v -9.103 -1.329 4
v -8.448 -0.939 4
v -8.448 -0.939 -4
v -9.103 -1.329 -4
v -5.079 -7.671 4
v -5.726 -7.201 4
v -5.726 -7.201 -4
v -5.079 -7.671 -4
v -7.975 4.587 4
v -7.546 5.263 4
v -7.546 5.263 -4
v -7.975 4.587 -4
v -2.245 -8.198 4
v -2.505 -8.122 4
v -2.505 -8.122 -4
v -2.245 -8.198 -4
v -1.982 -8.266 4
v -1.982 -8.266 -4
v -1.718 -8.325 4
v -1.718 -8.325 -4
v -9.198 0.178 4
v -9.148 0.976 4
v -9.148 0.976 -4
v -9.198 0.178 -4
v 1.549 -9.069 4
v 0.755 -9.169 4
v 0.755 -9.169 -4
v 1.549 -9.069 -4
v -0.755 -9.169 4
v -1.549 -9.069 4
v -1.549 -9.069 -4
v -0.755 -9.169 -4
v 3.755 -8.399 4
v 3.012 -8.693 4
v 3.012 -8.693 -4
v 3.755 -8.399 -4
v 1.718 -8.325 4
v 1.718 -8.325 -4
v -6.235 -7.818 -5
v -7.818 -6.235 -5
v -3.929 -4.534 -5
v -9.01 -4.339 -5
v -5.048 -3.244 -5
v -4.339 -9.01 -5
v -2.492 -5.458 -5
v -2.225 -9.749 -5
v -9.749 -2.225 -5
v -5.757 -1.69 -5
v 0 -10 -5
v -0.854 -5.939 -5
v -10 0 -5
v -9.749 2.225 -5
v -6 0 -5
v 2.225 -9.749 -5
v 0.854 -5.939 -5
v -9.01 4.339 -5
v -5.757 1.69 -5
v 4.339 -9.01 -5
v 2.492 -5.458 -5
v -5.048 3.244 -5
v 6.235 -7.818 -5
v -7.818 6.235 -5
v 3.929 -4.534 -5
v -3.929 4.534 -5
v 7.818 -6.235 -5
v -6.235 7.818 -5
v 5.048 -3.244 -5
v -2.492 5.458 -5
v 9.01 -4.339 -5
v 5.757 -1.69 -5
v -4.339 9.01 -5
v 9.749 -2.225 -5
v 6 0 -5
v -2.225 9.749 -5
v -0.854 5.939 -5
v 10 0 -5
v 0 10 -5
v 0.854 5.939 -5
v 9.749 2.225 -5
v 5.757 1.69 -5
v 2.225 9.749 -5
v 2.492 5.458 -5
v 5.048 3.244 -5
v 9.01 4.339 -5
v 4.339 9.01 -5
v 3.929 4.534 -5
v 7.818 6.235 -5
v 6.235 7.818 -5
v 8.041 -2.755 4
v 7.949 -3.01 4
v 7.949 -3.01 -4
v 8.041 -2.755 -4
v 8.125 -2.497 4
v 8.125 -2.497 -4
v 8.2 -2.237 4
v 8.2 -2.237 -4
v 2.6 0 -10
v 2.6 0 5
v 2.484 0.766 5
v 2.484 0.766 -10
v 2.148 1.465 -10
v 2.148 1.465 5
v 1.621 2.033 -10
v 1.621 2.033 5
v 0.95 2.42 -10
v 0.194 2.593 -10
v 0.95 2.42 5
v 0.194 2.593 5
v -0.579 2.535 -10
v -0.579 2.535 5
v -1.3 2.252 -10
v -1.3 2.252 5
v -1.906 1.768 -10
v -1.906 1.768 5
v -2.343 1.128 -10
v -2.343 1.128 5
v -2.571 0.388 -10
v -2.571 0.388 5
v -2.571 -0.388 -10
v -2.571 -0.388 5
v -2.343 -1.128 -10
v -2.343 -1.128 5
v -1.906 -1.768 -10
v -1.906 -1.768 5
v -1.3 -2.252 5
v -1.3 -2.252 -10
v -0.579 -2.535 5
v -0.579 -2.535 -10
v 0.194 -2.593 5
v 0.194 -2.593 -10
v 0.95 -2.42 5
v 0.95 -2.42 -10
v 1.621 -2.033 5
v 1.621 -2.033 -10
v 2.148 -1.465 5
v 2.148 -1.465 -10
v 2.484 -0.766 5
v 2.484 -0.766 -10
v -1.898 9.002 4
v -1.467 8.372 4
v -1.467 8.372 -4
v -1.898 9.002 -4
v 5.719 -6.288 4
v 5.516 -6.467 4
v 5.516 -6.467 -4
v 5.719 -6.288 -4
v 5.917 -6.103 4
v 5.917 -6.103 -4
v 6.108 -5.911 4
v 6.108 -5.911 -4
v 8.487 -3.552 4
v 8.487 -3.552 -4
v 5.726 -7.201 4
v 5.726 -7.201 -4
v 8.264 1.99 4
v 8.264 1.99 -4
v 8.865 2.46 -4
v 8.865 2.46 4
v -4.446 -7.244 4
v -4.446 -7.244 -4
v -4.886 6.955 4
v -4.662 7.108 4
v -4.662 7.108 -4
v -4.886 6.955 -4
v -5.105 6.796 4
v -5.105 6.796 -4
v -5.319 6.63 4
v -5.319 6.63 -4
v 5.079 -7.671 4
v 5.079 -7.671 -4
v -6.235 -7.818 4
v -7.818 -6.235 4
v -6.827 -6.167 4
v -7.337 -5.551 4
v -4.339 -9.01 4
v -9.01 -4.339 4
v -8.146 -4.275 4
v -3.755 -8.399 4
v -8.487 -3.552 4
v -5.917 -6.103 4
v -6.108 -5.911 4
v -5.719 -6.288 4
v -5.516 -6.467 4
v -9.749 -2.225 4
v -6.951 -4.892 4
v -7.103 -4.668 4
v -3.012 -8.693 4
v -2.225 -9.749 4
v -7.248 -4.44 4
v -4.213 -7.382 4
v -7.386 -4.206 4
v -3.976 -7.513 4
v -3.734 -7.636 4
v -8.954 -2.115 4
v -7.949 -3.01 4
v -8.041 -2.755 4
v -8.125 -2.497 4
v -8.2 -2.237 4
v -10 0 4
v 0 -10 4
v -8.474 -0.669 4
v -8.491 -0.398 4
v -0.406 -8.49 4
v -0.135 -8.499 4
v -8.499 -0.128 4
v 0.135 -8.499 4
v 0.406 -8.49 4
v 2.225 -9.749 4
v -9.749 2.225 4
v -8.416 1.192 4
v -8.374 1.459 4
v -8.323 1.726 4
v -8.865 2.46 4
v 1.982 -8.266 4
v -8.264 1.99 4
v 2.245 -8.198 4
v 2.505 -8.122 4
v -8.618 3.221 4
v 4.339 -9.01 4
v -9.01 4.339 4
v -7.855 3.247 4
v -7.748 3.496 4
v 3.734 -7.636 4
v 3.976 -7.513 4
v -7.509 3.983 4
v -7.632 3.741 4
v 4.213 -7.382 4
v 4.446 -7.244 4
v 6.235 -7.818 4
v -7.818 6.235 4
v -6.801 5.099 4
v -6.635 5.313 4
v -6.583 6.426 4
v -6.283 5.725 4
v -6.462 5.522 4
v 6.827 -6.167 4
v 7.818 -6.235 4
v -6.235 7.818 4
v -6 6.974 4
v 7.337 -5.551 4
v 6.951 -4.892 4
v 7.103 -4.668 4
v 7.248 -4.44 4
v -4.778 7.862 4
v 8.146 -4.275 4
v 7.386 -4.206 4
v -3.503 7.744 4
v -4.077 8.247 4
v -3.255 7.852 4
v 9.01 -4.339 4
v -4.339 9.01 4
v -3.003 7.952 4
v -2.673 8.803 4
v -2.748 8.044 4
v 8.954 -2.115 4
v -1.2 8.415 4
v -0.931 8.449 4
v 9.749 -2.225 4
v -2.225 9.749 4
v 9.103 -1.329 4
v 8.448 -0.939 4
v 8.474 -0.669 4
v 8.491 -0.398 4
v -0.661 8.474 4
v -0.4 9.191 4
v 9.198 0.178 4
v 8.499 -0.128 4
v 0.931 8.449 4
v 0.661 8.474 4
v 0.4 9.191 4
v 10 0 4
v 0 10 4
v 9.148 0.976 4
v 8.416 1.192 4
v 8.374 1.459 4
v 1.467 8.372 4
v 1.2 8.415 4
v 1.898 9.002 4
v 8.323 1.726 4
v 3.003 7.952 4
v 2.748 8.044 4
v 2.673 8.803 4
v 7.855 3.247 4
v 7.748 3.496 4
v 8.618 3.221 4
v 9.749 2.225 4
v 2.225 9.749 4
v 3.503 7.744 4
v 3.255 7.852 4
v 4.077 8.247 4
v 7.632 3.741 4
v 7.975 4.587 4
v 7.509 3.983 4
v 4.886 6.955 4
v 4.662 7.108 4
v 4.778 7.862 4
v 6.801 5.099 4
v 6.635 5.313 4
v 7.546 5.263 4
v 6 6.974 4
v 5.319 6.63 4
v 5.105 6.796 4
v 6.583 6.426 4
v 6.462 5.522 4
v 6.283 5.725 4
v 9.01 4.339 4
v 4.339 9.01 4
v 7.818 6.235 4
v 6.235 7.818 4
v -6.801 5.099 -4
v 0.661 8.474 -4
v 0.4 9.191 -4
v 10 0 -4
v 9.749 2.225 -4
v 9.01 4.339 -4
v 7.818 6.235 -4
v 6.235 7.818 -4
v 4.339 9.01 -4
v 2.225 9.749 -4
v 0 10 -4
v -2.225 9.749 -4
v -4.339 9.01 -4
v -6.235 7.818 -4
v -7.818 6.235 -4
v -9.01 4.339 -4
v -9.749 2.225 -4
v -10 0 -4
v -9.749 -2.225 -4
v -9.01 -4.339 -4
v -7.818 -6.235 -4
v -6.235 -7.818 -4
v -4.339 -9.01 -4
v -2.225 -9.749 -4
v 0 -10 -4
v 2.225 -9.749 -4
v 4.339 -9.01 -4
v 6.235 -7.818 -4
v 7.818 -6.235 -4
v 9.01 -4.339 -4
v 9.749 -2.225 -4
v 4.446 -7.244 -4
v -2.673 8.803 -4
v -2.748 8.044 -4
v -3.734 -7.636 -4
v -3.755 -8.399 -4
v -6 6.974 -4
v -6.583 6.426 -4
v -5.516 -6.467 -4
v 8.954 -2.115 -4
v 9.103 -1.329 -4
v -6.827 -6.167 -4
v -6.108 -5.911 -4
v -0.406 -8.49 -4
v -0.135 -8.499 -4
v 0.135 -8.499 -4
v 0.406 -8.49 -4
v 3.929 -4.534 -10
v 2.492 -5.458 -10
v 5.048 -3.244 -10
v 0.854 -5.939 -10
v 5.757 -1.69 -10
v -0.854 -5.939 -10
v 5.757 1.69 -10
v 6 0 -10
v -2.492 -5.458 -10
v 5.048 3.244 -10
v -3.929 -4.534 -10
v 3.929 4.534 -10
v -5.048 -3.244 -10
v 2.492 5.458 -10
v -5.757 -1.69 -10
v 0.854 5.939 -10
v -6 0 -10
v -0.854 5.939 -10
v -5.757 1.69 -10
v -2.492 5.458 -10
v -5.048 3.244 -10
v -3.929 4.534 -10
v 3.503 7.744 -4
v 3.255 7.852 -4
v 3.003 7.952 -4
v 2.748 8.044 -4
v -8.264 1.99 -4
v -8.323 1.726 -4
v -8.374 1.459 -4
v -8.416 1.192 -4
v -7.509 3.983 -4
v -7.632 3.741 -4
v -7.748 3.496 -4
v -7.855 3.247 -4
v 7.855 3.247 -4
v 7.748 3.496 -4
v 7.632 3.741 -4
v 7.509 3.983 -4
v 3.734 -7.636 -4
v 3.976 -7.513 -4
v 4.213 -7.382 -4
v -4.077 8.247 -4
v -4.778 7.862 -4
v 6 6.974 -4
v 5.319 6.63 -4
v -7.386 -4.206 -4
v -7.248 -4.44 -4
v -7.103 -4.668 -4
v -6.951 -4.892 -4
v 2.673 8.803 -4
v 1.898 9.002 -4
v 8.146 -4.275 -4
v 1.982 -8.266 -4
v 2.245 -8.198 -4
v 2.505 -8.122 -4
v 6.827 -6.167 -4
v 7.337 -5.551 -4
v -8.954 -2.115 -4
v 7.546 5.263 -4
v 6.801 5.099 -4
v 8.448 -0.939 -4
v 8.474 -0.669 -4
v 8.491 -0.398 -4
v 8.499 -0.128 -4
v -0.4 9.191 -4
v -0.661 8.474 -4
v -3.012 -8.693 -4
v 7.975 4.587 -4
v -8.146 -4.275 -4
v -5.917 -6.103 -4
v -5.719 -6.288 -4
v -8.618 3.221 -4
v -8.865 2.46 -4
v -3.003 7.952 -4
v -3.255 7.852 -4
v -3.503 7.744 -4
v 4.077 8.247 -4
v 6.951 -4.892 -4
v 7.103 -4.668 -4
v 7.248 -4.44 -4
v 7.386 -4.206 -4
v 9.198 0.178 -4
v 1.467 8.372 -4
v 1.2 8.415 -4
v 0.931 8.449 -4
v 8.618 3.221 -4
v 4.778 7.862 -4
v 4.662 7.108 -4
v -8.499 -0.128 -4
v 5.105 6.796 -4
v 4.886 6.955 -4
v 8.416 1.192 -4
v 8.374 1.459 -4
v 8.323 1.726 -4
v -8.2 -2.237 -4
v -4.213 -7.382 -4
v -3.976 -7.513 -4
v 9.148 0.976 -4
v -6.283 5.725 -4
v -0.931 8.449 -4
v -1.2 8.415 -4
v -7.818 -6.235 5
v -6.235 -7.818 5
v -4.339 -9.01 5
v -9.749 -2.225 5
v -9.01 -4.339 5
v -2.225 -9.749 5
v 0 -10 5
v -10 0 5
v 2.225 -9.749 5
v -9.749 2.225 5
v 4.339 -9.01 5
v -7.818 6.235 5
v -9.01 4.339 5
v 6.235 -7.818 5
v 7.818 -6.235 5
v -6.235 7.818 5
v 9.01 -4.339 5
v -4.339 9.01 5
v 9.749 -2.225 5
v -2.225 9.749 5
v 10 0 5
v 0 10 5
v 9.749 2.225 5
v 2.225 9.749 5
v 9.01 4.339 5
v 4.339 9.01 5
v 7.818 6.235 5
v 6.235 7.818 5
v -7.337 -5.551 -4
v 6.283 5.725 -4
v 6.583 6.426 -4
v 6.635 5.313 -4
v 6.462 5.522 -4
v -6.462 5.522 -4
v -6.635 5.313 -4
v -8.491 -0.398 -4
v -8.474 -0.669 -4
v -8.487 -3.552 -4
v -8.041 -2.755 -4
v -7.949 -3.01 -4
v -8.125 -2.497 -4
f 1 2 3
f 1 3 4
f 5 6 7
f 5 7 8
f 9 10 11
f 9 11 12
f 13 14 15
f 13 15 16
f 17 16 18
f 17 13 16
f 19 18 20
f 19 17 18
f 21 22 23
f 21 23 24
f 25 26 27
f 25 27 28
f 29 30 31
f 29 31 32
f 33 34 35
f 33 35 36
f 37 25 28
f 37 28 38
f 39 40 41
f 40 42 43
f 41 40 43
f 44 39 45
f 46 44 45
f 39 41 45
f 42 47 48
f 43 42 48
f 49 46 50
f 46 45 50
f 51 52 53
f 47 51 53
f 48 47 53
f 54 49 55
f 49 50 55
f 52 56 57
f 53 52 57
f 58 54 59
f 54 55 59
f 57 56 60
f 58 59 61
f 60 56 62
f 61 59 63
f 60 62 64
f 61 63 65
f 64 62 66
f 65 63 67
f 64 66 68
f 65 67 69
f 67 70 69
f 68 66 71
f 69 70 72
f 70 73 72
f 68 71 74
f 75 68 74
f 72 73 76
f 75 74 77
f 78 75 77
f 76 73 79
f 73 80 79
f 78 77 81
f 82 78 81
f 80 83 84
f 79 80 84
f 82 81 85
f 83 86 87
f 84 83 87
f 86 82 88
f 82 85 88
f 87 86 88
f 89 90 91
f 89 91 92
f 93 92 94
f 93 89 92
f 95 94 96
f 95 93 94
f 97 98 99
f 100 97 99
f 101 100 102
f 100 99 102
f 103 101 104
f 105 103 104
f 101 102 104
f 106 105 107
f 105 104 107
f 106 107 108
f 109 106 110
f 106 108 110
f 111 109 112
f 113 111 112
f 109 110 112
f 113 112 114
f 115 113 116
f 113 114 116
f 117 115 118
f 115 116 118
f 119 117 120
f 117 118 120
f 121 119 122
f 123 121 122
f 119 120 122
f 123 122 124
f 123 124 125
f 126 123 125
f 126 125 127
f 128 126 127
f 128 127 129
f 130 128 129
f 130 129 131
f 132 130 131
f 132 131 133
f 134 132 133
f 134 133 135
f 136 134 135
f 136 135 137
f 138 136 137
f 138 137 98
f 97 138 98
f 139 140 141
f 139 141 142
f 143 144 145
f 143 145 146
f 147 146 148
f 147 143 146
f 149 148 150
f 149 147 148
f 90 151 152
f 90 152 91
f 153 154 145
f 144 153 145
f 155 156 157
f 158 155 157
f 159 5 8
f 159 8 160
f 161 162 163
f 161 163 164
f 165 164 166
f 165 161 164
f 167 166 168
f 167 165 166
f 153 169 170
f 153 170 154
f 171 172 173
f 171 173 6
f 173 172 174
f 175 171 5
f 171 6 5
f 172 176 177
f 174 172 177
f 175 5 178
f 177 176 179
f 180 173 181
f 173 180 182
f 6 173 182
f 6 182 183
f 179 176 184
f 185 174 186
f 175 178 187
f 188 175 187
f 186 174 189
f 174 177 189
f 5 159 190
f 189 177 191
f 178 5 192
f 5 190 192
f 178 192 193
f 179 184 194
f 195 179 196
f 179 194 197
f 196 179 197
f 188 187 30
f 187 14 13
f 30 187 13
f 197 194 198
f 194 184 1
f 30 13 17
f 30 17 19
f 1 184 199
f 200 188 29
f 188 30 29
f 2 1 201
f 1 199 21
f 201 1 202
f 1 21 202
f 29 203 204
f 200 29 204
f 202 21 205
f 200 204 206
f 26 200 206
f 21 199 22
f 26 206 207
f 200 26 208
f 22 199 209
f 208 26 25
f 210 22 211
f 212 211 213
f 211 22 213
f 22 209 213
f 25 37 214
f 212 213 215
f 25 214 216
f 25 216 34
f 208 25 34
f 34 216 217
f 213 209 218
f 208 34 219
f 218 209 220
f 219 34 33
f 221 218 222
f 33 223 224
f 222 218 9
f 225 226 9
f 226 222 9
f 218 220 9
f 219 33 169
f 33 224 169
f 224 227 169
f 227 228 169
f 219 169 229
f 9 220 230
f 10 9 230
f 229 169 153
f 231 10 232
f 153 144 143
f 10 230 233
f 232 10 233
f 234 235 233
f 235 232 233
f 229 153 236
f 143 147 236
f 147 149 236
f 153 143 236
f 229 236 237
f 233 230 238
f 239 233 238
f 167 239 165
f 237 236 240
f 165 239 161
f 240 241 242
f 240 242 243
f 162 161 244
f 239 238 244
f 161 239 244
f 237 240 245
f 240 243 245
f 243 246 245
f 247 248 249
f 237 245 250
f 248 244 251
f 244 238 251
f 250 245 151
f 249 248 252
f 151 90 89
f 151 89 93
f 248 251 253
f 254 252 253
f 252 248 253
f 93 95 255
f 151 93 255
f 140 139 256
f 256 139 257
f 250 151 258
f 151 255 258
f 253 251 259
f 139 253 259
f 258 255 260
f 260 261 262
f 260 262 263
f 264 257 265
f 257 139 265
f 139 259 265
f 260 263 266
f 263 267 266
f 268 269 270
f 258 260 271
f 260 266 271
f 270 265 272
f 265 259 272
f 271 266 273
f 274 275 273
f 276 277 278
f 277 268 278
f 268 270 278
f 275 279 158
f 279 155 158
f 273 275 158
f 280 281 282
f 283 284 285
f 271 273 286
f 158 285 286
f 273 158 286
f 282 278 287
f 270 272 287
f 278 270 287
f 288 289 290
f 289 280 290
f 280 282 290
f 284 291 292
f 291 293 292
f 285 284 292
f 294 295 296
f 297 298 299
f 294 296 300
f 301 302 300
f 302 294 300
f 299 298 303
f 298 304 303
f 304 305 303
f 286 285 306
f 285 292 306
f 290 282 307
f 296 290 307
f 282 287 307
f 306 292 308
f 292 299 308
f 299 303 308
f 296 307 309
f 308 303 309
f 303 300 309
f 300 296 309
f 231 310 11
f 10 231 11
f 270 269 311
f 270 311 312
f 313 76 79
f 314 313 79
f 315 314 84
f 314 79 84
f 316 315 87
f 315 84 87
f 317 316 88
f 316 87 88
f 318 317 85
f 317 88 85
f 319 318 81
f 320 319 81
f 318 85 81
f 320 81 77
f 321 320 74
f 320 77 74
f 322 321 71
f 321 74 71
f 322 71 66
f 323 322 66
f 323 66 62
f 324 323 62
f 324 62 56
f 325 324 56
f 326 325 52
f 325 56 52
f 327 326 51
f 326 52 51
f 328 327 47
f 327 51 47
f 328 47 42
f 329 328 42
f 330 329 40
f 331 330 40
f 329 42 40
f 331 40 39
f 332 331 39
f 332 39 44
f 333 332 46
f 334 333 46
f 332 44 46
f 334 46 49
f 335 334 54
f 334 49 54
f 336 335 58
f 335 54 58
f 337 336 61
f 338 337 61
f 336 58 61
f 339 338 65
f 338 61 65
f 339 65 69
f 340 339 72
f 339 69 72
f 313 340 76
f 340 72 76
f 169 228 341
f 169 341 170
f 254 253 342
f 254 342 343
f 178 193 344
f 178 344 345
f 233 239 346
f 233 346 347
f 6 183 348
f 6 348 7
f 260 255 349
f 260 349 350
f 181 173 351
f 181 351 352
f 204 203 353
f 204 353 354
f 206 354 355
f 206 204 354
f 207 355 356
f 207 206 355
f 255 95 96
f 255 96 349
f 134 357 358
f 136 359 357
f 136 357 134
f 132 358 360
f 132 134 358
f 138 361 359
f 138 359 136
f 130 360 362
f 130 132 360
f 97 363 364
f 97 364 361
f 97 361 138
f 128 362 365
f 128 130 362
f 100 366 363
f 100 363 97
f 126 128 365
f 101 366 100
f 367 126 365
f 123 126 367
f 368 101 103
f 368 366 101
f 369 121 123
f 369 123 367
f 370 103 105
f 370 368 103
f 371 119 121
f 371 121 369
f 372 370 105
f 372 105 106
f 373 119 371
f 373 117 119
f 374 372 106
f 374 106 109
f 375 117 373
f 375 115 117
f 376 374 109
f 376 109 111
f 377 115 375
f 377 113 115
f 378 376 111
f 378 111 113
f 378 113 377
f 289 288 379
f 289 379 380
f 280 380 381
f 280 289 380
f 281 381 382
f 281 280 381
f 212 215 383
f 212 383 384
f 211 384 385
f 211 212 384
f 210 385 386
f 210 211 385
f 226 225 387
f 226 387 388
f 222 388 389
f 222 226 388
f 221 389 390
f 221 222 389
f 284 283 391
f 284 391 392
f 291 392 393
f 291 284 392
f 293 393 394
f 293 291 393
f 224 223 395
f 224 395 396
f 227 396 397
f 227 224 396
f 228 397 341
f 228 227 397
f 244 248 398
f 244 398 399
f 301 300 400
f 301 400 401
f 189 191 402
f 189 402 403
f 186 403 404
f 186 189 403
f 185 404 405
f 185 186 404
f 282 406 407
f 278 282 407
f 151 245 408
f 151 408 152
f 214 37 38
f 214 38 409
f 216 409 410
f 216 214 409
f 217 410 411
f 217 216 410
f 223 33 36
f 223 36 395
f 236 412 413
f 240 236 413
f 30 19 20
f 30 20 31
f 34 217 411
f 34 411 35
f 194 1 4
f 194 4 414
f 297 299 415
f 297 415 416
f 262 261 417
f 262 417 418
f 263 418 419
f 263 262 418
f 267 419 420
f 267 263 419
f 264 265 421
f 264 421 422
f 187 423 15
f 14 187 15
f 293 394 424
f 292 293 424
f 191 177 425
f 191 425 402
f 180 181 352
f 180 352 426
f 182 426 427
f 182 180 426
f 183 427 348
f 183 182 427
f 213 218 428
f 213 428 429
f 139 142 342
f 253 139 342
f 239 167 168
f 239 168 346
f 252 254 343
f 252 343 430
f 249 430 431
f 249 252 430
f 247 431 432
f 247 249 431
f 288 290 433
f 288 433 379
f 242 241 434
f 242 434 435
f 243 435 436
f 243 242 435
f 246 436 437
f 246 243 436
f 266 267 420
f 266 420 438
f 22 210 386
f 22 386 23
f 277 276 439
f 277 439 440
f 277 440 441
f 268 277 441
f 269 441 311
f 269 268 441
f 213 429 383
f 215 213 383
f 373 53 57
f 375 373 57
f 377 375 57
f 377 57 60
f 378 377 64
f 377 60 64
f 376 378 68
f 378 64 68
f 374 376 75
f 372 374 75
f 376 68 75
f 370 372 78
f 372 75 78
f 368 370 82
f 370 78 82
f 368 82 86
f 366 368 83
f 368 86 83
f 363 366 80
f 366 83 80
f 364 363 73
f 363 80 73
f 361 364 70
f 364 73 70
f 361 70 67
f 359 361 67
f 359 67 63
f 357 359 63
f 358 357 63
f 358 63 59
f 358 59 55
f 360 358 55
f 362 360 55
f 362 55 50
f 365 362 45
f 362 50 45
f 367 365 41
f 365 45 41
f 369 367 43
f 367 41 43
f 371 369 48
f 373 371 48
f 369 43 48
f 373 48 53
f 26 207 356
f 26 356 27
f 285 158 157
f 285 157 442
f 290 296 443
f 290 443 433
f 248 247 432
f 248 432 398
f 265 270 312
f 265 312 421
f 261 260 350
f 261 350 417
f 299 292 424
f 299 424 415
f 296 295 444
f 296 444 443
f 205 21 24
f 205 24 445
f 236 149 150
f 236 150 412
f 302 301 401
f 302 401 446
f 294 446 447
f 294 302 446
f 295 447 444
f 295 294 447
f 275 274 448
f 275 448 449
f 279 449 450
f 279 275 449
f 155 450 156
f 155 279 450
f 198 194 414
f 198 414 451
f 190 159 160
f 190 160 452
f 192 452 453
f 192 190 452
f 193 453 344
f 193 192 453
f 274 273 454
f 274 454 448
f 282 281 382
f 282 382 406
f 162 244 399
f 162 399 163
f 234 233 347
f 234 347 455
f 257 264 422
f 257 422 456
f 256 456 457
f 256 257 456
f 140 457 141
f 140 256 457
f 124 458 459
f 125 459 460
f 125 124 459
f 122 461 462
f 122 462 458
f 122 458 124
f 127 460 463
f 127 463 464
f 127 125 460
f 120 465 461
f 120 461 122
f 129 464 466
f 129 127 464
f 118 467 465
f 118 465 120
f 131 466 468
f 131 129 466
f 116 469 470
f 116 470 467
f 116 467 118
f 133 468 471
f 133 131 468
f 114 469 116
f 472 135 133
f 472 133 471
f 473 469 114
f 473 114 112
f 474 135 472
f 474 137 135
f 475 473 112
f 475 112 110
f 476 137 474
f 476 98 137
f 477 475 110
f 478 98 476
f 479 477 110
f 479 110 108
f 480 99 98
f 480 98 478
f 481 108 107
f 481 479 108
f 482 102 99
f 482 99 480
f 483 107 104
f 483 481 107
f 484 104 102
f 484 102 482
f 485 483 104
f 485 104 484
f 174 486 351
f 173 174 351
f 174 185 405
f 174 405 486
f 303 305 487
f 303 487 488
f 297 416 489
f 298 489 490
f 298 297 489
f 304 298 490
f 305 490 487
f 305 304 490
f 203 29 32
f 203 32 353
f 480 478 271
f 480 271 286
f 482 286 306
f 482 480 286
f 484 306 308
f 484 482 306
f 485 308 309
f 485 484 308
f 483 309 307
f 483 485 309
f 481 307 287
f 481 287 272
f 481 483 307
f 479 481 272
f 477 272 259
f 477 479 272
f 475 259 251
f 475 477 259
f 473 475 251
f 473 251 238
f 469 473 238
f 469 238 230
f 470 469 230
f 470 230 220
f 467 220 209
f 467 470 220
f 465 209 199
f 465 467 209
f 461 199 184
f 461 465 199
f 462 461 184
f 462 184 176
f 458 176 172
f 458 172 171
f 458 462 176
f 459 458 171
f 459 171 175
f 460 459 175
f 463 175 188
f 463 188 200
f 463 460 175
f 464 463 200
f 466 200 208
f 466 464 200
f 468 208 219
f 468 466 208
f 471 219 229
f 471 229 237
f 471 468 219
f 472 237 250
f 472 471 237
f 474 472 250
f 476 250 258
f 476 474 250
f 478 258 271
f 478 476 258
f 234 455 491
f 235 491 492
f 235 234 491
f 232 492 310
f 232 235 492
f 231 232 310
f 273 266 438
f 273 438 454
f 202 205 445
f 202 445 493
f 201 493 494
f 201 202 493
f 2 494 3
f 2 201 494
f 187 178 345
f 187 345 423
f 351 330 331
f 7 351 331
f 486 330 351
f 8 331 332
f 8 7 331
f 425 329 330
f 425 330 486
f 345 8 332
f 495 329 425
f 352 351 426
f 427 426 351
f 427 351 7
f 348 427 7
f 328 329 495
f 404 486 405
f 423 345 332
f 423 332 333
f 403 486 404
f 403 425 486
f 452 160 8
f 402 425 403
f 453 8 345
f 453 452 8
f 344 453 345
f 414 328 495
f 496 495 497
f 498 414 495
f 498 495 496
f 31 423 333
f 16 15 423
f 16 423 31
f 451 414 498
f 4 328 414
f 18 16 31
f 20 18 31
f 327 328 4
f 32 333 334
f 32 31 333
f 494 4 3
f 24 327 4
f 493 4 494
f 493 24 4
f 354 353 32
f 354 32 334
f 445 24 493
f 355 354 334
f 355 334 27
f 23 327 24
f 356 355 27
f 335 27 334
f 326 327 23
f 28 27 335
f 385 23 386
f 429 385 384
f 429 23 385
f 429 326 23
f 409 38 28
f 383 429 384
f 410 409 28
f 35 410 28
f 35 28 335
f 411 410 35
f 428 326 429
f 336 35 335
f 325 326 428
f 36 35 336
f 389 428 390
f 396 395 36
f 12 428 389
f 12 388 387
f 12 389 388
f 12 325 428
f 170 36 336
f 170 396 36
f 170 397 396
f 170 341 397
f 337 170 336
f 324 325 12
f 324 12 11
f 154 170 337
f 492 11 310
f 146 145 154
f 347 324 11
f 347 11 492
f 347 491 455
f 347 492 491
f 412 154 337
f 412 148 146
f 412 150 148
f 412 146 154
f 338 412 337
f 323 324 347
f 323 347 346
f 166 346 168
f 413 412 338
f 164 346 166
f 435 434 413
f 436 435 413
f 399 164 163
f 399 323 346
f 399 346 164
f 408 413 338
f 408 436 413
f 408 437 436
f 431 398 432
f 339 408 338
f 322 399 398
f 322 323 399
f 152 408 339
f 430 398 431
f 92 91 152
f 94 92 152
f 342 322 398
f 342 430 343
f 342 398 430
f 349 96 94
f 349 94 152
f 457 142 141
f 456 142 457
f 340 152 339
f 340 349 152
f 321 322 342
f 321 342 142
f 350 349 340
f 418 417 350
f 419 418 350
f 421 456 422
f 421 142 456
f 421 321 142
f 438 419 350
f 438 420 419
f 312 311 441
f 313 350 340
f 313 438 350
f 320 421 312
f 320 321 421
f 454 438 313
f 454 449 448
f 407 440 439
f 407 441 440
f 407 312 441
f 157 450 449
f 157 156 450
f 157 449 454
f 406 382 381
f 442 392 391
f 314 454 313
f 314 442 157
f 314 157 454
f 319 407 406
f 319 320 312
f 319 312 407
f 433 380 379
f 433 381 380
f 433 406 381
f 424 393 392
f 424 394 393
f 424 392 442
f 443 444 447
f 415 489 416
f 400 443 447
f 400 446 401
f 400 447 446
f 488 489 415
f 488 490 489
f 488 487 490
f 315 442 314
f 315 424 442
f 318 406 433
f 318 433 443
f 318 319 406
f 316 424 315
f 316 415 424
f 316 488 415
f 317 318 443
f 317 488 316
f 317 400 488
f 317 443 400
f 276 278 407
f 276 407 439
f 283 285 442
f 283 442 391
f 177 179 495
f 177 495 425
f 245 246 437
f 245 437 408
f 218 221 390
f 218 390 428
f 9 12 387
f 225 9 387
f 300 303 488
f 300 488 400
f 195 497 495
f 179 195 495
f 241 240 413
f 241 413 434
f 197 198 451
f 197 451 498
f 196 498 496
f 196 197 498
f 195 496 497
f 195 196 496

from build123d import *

# Parameters (mm, degrees)
BOSS_EXTRUDE1_DEPTH = 5
SKETCH2_R           = 10
BOSS_EXTRUDE2_DEPTH = 1
SKETCH4_R           = 6
BOSS_EXTRUDE3_DEPTH = 5
CUT_EXTRUDE1_REACH  = 22.616
SKETCH5_R           = 2.6


with BuildPart() as part:
    # Sketch1 → Boss-Extrude1 (new, symmetric)
    with BuildSketch(Plane.XY):
        with BuildLine():
            Line((-0.4, 9.191300234), (-0.660980834, 8.474261286))
            ThreePointArc((-0.660980834, 8.474261286), (-1.065332485, 8.432974961), (-1.467248177, 8.372406033))
            Line((-1.467248177, 8.372406033), (-1.898350154, 9.002014591))
            Line((-1.898350154, 9.002014591), (-2.673216683, 8.803062681))
            Line((-2.673216683, 8.803062681), (-2.747677989, 8.043647535))
            ThreePointArc((-2.747677989, 8.043647535), (-3.129058698, 7.90310013), (-3.503284589, 7.744481718))
            Line((-3.503284589, 7.744481718), (-4.077419986, 8.247099263))
            Line((-4.077419986, 8.247099263), (-4.77846533, 7.861696324))
            Line((-4.77846533, 7.861696324), (-4.66172843, 7.107621828))
            ThreePointArc((-4.66172843, 7.107621828), (-4.996174644, 6.876644452), (-5.319196746, 6.629943135))
            Line((-5.319196746, 6.629943135), (-6.000290524, 6.973988359))
            Line((-6.000290524, 6.973988359), (-6.583465426, 6.426350674))
            Line((-6.583465426, 6.426350674), (-6.282865329, 5.724998101))
            ThreePointArc((-6.282865329, 5.724998101), (-6.549362564, 5.418103913), (-6.80088421, 5.098820841))
            Line((-6.80088421, 5.098820841), (-7.546140742, 5.262676117))
            Line((-7.546140742, 5.262676117), (-7.974802178, 4.587213776))
            Line((-7.974802178, 4.587213776), (-7.509226693, 3.982651688))
            ThreePointArc((-7.509226693, 3.982651688), (-7.691029946, 3.619123978), (-7.855247106, 3.247320882))
            Line((-7.855247106, 3.247320882), (-8.617839183, 3.220690579))
            Line((-8.617839183, 3.220690579), (-8.865052779, 2.459845366))
            Line((-8.865052779, 2.459845366), (-8.263755727, 1.990060623))
            ThreePointArc((-8.263755727, 1.990060623), (-8.349441631, 1.592741174), (-8.416035937, 1.191779808))
            Line((-8.416035937, 1.191779808), (-9.148047095, 0.976337208))
            Line((-9.148047095, 0.976337208), (-9.198279511, 0.177915826))
            Line((-9.198279511, 0.177915826), (-8.499042597, -0.127573271))
            ThreePointArc((-8.499042597, -0.127573271), (-8.483227192, -0.533719416), (-8.448014278, -0.938645173))
            Line((-8.448014278, -0.938645173), (-9.103449564, -1.32936302))
            Line((-9.103449564, -1.32936302), (-8.953544512, -2.115192821))
            Line((-8.953544512, -2.115192821), (-8.200303363, -2.237191266))
            ThreePointArc((-8.200303363, -2.237191266), (-8.083980389, -2.626644452), (-7.949172812, -3.010091627))
            Line((-7.949172812, -3.010091627), (-8.486848816, -3.551534481))
            Line((-8.486848816, -3.551534481), (-8.146225383, -4.275396123))
            Line((-8.146225383, -4.275396123), (-7.38630891, -4.206238307))
            ThreePointArc((-7.38630891, -4.206238307), (-7.176787367, -4.554527757), (-6.950855584, -4.892402953))
            Line((-6.950855584, -4.892402953), (-7.336988145, -5.550549969))
            Line((-7.336988145, -5.550549969), (-6.827048953, -6.166960564))
            Line((-6.827048953, -6.166960564), (-6.108205503, -5.910991925))
            ThreePointArc((-6.108205503, -5.910991925), (-5.8186504, -6.196233333), (-5.515790536, -6.467306608))
            Line((-5.515790536, -6.467306608), (-5.726117525, -7.200803989))
            Line((-5.726117525, -7.200803989), (-5.078903929, -7.671032191))
            Line((-5.078903929, -7.671032191), (-4.44630108, -7.244336181))
            ThreePointArc((-4.44630108, -7.244336181), (-4.09490623, -7.44860678), (-3.734148082, -7.635845605))
            Line((-3.734148082, -7.635845605), (-3.755453882, -8.398605012))
            Line((-3.755453882, -8.398605012), (-3.011632693, -8.693104654))
            Line((-3.011632693, -8.693104654), (-2.505019208, -8.122492153))
            ThreePointArc((-2.505019208, -8.122492153), (-2.113864041, -8.23295687), (-1.717875372, -8.324596339))
            Line((-1.717875372, -8.324596339), (-1.54882126, -9.068690793))
            Line((-1.54882126, -9.068690793), (-0.755129499, -9.16895738))
            Line((-0.755129499, -9.16895738), (-0.406337766, -8.49028207))
            ThreePointArc((-0.406337766, -8.49028207), (0, -8.5), (0.406337766, -8.49028207))
            Line((0.406337766, -8.49028207), (0.755129499, -9.16895738))
            Line((0.755129499, -9.16895738), (1.54882126, -9.068690793))
            Line((1.54882126, -9.068690793), (1.717875372, -8.324596339))
            ThreePointArc((1.717875372, -8.324596339), (2.113864041, -8.23295687), (2.505019208, -8.122492153))
            Line((2.505019208, -8.122492153), (3.011632693, -8.693104654))
            Line((3.011632693, -8.693104654), (3.755453882, -8.398605012))
            Line((3.755453882, -8.398605012), (3.734148082, -7.635845605))
            ThreePointArc((3.734148082, -7.635845605), (4.09490623, -7.44860678), (4.44630108, -7.244336181))
            Line((4.44630108, -7.244336181), (5.078903929, -7.671032191))
            Line((5.078903929, -7.671032191), (5.726117525, -7.200803989))
            Line((5.726117525, -7.200803989), (5.515790536, -6.467306608))
            ThreePointArc((5.515790536, -6.467306608), (5.8186504, -6.196233333), (6.108205503, -5.910991925))
            Line((6.108205503, -5.910991925), (6.827048953, -6.166960564))
            Line((6.827048953, -6.166960564), (7.336988145, -5.550549969))
            Line((7.336988145, -5.550549969), (6.950855584, -4.892402953))
            ThreePointArc((6.950855584, -4.892402953), (7.176787367, -4.554527757), (7.38630891, -4.206238307))
            Line((7.38630891, -4.206238307), (8.146225383, -4.275396123))
            Line((8.146225383, -4.275396123), (8.486848816, -3.551534481))
            Line((8.486848816, -3.551534481), (7.949172812, -3.010091627))
            ThreePointArc((7.949172812, -3.010091627), (8.083980389, -2.626644452), (8.200303363, -2.237191266))
            Line((8.200303363, -2.237191266), (8.953544512, -2.115192821))
            Line((8.953544512, -2.115192821), (9.103449564, -1.32936302))
            Line((9.103449564, -1.32936302), (8.448014278, -0.938645173))
            ThreePointArc((8.448014278, -0.938645173), (8.483227192, -0.533719416), (8.499042597, -0.127573271))
            Line((8.499042597, -0.127573271), (9.198279511, 0.177915826))
            Line((9.198279511, 0.177915826), (9.148047095, 0.976337208))
            Line((9.148047095, 0.976337208), (8.416035937, 1.191779808))
            ThreePointArc((8.416035937, 1.191779808), (8.349441631, 1.592741174), (8.263755727, 1.990060623))
            Line((8.263755727, 1.990060623), (8.865052779, 2.459845366))
            Line((8.865052779, 2.459845366), (8.617839183, 3.220690579))
            Line((8.617839183, 3.220690579), (7.855247106, 3.247320882))
            ThreePointArc((7.855247106, 3.247320882), (7.691029946, 3.619123978), (7.509226693, 3.982651688))
            Line((7.509226693, 3.982651688), (7.974802178, 4.587213776))
            Line((7.974802178, 4.587213776), (7.546140742, 5.262676117))
            Line((7.546140742, 5.262676117), (6.80088421, 5.098820841))
            ThreePointArc((6.80088421, 5.098820841), (6.549362564, 5.418103913), (6.282865329, 5.724998101))
            Line((6.282865329, 5.724998101), (6.583465426, 6.426350674))
            Line((6.583465426, 6.426350674), (6.000290524, 6.973988359))
            Line((6.000290524, 6.973988359), (5.319196746, 6.629943135))
            ThreePointArc((5.319196746, 6.629943135), (4.996174644, 6.876644452), (4.66172843, 7.107621828))
            Line((4.66172843, 7.107621828), (4.77846533, 7.861696324))
            Line((4.77846533, 7.861696324), (4.077419986, 8.247099263))
            Line((4.077419986, 8.247099263), (3.503284589, 7.744481718))
            ThreePointArc((3.503284589, 7.744481718), (3.129058698, 7.90310013), (2.747677989, 8.043647535))
            Line((2.747677989, 8.043647535), (2.673216683, 8.803062681))
            Line((2.673216683, 8.803062681), (1.898350154, 9.002014591))
            Line((1.898350154, 9.002014591), (1.467248177, 8.372406033))
            ThreePointArc((1.467248177, 8.372406033), (1.065332485, 8.432974961), (0.660980834, 8.474261286))
            Line((0.660980834, 8.474261286), (0.4, 9.191300234))
            Line((0.4, 9.191300234), (-0.4, 9.191300234))
        make_face()
    extrude(amount=BOSS_EXTRUDE1_DEPTH, both=True)

    # Sketch2 → Boss-Extrude2 (add)
    with BuildSketch(Plane.XY.offset(5)):
        Circle(SKETCH2_R)
    boss_extrude2 = extrude(amount=-BOSS_EXTRUDE2_DEPTH)

    # Mirror1: Boss-Extrude2 across plane
    add(boss_extrude2.mirror(Plane.XY))

    # Sketch4 → Boss-Extrude3 (add)
    with BuildSketch(Plane(origin=(0, 0, -5), x_dir=(-1, 0, 0), z_dir=(0, 0, -1))):
        Circle(SKETCH4_R)
    extrude(amount=BOSS_EXTRUDE3_DEPTH)

    # Sketch5 → Cut-Extrude1 (cut, up to next)
    with BuildSketch(Plane.XY.offset(5), mode=Mode.PRIVATE) as cut_extrude1_sk1:
        Circle(SKETCH5_R)
    cut_extrude1_tool1 = extrude(cut_extrude1_sk1.sketch, amount=-CUT_EXTRUDE1_REACH, mode=Mode.PRIVATE) & part.part
    add(cut_extrude1_tool1.solids().sort_by_distance((0, 0, 5))[0], mode=Mode.SUBTRACT)


solid = part.part
